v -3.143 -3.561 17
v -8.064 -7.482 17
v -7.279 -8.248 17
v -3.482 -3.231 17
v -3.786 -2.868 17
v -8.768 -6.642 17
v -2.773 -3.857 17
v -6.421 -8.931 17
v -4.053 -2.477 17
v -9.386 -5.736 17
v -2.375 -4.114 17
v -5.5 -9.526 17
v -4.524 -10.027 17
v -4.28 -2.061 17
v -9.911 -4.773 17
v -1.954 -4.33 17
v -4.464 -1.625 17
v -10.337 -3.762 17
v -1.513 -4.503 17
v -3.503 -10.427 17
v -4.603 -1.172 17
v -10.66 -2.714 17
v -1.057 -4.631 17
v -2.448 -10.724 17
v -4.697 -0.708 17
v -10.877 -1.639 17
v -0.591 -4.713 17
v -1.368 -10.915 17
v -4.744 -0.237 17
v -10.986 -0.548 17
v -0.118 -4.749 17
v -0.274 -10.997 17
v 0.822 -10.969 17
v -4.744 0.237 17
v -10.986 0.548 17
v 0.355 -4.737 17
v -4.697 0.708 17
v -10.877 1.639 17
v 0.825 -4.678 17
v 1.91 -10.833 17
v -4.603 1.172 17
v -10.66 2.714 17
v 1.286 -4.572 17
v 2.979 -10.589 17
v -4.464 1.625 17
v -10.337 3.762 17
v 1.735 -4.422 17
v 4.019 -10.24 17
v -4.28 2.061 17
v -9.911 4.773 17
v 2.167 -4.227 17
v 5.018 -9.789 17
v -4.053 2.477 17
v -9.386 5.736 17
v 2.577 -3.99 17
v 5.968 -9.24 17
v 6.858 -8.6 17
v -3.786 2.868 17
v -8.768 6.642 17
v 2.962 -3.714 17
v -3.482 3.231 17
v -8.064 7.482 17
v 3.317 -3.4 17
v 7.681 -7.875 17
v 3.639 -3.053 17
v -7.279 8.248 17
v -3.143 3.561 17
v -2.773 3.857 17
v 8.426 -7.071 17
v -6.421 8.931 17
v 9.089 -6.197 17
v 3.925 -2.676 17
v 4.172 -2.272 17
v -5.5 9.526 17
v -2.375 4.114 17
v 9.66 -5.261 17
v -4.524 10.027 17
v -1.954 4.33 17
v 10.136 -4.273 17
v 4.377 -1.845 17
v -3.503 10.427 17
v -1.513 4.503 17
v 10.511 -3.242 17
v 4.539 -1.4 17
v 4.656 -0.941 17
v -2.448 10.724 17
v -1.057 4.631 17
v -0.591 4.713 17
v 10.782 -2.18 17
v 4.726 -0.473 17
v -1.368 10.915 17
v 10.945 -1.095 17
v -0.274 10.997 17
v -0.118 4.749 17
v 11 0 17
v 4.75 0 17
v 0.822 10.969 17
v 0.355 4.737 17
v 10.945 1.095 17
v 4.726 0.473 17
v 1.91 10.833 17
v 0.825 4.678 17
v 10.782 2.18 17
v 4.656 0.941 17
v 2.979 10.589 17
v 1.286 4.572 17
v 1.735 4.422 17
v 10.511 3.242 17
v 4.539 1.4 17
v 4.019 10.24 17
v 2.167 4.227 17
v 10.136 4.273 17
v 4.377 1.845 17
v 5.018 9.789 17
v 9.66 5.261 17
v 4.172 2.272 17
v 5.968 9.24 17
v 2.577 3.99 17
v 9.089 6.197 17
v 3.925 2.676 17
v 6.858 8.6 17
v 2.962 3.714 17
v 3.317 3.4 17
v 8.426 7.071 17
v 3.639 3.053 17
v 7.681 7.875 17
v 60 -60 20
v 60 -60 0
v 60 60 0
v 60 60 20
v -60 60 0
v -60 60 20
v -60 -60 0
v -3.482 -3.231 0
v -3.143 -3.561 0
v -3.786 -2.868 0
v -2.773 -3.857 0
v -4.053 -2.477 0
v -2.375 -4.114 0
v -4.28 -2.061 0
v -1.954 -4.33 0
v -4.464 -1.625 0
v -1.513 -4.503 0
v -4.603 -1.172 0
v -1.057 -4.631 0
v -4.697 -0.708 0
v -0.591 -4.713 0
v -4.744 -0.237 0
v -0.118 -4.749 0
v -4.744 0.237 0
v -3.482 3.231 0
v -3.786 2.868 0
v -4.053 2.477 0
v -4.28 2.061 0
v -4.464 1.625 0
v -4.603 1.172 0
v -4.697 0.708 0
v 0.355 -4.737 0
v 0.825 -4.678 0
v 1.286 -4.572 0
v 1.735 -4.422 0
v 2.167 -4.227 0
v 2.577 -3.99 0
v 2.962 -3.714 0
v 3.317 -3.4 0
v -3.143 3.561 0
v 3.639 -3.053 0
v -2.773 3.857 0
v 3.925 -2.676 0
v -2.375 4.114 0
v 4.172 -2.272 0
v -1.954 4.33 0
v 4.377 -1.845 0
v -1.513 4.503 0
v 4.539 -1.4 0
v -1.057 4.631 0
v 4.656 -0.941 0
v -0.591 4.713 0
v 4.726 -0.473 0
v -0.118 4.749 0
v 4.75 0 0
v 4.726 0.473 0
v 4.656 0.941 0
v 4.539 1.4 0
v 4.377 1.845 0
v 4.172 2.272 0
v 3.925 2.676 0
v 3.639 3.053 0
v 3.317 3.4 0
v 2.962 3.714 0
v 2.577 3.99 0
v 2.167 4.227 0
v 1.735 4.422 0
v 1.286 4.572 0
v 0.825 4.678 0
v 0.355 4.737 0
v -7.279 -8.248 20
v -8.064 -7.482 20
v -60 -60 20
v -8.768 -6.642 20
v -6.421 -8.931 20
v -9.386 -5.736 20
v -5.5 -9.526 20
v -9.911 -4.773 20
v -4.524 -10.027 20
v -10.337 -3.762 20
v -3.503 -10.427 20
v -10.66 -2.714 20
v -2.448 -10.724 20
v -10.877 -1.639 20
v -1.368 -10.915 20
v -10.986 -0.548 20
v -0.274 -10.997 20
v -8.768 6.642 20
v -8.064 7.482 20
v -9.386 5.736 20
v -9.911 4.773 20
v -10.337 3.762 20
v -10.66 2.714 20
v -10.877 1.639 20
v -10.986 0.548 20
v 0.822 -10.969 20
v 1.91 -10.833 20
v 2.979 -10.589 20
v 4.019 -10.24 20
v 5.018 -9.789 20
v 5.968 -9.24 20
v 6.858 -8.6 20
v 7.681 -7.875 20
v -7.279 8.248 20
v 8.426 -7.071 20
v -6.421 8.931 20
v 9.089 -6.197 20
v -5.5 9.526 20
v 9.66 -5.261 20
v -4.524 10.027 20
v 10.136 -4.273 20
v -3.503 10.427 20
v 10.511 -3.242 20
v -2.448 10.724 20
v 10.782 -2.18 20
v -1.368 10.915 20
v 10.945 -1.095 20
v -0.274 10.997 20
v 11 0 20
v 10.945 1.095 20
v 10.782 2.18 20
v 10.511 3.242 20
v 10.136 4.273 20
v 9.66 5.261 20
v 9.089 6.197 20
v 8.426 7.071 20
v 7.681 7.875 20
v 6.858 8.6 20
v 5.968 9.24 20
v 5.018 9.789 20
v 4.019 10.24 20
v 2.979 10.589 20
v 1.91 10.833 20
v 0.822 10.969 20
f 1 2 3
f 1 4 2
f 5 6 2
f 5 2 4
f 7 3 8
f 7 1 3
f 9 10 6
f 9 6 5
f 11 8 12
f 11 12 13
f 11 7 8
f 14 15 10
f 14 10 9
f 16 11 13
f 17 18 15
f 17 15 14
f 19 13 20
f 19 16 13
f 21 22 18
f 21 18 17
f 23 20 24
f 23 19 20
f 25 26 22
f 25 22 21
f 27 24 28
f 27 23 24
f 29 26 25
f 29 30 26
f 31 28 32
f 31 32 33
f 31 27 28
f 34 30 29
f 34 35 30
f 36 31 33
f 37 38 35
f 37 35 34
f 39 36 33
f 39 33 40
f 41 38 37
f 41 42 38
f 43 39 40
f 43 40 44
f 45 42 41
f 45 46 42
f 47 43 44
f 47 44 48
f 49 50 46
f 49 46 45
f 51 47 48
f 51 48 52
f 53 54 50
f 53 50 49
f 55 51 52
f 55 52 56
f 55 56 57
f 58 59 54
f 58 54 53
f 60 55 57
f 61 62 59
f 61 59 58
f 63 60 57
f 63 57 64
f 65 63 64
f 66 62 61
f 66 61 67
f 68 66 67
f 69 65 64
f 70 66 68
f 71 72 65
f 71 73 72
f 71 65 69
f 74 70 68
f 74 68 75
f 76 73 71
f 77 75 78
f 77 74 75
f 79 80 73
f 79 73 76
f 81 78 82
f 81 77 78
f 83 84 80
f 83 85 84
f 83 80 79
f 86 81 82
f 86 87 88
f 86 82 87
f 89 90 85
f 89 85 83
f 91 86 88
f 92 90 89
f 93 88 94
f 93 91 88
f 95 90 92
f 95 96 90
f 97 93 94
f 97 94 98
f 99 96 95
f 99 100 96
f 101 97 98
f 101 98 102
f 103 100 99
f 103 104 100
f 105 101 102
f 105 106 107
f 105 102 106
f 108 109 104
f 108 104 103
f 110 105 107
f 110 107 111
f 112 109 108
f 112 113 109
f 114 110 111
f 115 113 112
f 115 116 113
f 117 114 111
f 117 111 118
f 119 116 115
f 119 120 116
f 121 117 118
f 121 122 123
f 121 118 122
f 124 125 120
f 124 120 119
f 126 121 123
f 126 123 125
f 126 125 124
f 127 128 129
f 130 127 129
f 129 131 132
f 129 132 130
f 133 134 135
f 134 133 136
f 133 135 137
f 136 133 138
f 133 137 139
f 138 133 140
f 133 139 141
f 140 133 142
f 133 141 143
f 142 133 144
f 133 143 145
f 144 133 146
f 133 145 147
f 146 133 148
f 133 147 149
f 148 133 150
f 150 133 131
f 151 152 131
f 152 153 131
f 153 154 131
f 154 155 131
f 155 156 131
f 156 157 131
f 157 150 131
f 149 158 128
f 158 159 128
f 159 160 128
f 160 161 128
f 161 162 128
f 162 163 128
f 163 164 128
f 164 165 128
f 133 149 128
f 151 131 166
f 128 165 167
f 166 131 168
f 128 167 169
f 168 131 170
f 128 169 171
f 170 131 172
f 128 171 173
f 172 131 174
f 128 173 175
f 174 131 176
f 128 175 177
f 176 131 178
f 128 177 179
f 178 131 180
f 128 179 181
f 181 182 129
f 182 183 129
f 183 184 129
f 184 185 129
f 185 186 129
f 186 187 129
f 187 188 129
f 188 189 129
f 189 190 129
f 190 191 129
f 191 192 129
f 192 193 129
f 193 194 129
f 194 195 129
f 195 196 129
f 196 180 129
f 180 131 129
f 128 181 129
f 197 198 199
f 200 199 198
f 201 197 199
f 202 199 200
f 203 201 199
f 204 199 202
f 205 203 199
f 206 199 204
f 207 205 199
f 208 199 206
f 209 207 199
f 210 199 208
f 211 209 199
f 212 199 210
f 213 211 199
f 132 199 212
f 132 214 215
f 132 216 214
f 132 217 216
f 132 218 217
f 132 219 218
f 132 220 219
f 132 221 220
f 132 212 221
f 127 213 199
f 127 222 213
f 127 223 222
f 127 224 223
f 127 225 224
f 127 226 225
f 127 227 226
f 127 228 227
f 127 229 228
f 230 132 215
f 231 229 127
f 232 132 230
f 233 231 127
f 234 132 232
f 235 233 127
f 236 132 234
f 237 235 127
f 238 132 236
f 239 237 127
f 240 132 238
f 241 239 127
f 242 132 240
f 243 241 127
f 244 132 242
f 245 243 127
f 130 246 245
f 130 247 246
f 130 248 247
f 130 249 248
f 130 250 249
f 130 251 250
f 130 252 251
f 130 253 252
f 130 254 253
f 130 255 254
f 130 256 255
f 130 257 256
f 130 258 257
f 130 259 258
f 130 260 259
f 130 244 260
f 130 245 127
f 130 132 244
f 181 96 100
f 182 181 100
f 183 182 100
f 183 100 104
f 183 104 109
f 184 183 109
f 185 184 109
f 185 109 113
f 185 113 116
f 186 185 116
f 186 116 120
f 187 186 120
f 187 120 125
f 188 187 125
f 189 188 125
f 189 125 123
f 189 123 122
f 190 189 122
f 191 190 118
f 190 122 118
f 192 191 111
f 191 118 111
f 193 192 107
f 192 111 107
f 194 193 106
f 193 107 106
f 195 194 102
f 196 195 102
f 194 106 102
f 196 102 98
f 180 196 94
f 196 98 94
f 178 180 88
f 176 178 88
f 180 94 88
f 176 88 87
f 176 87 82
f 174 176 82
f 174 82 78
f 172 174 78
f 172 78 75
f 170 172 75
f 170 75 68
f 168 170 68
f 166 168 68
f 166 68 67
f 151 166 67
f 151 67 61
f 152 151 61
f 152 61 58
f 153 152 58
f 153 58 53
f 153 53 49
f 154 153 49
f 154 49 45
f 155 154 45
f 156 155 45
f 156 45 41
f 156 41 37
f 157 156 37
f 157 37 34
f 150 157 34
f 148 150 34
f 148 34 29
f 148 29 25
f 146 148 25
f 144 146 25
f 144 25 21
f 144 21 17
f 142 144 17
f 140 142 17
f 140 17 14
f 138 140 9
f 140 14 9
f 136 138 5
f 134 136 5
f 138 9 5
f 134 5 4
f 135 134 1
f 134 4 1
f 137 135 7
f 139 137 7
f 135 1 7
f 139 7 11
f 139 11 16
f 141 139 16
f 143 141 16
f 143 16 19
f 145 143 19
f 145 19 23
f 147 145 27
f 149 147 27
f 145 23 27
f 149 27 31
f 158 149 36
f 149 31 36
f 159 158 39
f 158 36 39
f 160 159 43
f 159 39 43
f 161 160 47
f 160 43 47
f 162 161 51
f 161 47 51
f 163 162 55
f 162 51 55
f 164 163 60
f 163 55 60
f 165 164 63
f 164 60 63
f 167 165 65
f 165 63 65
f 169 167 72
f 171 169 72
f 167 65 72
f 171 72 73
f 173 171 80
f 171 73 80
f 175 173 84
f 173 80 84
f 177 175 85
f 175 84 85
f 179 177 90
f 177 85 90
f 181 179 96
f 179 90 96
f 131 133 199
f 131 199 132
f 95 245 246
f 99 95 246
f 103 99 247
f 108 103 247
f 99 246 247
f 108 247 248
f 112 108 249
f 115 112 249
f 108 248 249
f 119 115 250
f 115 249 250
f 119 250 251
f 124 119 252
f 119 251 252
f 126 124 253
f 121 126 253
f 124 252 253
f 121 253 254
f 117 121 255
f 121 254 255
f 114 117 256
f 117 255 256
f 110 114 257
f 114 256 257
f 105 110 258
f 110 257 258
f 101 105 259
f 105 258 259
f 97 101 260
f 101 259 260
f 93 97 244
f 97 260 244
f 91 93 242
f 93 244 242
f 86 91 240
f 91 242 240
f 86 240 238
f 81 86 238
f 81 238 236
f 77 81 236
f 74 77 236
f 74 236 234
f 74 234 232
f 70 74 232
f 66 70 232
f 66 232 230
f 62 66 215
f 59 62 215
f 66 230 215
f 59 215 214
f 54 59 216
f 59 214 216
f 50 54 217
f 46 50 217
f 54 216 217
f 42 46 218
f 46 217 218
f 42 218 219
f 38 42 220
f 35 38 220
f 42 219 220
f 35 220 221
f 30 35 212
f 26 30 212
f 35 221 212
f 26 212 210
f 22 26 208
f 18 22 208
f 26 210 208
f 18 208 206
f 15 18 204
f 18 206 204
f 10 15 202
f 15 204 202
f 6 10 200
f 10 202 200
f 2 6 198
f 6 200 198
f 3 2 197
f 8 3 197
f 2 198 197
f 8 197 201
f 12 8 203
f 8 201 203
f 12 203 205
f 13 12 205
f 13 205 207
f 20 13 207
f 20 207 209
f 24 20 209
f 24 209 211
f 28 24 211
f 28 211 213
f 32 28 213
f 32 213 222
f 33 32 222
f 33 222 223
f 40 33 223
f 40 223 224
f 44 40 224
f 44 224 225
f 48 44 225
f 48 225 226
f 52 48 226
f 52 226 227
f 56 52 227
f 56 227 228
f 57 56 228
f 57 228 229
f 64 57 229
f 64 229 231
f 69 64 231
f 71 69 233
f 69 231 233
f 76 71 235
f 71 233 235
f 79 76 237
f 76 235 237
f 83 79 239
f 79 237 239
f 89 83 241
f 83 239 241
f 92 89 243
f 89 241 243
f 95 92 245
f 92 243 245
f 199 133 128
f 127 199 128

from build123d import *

# Parameters (mm, degrees)
SKETCH_W        = 120
SKETCH_H        = 120
PAD_DEPTH       = 20
SKETCH001_R     = 4.75
POCKET_DEPTH    = 20.001
SKETCH002_R     = 11
POCKET001_DEPTH = 3


with BuildPart() as part:
    # Sketch → Pad (new body)
    with BuildSketch(Plane.XY):
        Rectangle(SKETCH_W, SKETCH_H)
    extrude(amount=PAD_DEPTH)

    # Sketch001 (on Face6 of Pad) → Pocket (cut, through all)
    with BuildSketch(Plane.XY.offset(20)):
        Circle(SKETCH001_R)
    extrude(amount=-POCKET_DEPTH, mode=Mode.SUBTRACT)

    # Sketch002 (on Face5 of Pocket) → Pocket001 (cut)
    with BuildSketch(Plane.XY.offset(20)):
        Circle(SKETCH002_R)
    extrude(amount=-POCKET001_DEPTH, mode=Mode.SUBTRACT)


solid = part.part
